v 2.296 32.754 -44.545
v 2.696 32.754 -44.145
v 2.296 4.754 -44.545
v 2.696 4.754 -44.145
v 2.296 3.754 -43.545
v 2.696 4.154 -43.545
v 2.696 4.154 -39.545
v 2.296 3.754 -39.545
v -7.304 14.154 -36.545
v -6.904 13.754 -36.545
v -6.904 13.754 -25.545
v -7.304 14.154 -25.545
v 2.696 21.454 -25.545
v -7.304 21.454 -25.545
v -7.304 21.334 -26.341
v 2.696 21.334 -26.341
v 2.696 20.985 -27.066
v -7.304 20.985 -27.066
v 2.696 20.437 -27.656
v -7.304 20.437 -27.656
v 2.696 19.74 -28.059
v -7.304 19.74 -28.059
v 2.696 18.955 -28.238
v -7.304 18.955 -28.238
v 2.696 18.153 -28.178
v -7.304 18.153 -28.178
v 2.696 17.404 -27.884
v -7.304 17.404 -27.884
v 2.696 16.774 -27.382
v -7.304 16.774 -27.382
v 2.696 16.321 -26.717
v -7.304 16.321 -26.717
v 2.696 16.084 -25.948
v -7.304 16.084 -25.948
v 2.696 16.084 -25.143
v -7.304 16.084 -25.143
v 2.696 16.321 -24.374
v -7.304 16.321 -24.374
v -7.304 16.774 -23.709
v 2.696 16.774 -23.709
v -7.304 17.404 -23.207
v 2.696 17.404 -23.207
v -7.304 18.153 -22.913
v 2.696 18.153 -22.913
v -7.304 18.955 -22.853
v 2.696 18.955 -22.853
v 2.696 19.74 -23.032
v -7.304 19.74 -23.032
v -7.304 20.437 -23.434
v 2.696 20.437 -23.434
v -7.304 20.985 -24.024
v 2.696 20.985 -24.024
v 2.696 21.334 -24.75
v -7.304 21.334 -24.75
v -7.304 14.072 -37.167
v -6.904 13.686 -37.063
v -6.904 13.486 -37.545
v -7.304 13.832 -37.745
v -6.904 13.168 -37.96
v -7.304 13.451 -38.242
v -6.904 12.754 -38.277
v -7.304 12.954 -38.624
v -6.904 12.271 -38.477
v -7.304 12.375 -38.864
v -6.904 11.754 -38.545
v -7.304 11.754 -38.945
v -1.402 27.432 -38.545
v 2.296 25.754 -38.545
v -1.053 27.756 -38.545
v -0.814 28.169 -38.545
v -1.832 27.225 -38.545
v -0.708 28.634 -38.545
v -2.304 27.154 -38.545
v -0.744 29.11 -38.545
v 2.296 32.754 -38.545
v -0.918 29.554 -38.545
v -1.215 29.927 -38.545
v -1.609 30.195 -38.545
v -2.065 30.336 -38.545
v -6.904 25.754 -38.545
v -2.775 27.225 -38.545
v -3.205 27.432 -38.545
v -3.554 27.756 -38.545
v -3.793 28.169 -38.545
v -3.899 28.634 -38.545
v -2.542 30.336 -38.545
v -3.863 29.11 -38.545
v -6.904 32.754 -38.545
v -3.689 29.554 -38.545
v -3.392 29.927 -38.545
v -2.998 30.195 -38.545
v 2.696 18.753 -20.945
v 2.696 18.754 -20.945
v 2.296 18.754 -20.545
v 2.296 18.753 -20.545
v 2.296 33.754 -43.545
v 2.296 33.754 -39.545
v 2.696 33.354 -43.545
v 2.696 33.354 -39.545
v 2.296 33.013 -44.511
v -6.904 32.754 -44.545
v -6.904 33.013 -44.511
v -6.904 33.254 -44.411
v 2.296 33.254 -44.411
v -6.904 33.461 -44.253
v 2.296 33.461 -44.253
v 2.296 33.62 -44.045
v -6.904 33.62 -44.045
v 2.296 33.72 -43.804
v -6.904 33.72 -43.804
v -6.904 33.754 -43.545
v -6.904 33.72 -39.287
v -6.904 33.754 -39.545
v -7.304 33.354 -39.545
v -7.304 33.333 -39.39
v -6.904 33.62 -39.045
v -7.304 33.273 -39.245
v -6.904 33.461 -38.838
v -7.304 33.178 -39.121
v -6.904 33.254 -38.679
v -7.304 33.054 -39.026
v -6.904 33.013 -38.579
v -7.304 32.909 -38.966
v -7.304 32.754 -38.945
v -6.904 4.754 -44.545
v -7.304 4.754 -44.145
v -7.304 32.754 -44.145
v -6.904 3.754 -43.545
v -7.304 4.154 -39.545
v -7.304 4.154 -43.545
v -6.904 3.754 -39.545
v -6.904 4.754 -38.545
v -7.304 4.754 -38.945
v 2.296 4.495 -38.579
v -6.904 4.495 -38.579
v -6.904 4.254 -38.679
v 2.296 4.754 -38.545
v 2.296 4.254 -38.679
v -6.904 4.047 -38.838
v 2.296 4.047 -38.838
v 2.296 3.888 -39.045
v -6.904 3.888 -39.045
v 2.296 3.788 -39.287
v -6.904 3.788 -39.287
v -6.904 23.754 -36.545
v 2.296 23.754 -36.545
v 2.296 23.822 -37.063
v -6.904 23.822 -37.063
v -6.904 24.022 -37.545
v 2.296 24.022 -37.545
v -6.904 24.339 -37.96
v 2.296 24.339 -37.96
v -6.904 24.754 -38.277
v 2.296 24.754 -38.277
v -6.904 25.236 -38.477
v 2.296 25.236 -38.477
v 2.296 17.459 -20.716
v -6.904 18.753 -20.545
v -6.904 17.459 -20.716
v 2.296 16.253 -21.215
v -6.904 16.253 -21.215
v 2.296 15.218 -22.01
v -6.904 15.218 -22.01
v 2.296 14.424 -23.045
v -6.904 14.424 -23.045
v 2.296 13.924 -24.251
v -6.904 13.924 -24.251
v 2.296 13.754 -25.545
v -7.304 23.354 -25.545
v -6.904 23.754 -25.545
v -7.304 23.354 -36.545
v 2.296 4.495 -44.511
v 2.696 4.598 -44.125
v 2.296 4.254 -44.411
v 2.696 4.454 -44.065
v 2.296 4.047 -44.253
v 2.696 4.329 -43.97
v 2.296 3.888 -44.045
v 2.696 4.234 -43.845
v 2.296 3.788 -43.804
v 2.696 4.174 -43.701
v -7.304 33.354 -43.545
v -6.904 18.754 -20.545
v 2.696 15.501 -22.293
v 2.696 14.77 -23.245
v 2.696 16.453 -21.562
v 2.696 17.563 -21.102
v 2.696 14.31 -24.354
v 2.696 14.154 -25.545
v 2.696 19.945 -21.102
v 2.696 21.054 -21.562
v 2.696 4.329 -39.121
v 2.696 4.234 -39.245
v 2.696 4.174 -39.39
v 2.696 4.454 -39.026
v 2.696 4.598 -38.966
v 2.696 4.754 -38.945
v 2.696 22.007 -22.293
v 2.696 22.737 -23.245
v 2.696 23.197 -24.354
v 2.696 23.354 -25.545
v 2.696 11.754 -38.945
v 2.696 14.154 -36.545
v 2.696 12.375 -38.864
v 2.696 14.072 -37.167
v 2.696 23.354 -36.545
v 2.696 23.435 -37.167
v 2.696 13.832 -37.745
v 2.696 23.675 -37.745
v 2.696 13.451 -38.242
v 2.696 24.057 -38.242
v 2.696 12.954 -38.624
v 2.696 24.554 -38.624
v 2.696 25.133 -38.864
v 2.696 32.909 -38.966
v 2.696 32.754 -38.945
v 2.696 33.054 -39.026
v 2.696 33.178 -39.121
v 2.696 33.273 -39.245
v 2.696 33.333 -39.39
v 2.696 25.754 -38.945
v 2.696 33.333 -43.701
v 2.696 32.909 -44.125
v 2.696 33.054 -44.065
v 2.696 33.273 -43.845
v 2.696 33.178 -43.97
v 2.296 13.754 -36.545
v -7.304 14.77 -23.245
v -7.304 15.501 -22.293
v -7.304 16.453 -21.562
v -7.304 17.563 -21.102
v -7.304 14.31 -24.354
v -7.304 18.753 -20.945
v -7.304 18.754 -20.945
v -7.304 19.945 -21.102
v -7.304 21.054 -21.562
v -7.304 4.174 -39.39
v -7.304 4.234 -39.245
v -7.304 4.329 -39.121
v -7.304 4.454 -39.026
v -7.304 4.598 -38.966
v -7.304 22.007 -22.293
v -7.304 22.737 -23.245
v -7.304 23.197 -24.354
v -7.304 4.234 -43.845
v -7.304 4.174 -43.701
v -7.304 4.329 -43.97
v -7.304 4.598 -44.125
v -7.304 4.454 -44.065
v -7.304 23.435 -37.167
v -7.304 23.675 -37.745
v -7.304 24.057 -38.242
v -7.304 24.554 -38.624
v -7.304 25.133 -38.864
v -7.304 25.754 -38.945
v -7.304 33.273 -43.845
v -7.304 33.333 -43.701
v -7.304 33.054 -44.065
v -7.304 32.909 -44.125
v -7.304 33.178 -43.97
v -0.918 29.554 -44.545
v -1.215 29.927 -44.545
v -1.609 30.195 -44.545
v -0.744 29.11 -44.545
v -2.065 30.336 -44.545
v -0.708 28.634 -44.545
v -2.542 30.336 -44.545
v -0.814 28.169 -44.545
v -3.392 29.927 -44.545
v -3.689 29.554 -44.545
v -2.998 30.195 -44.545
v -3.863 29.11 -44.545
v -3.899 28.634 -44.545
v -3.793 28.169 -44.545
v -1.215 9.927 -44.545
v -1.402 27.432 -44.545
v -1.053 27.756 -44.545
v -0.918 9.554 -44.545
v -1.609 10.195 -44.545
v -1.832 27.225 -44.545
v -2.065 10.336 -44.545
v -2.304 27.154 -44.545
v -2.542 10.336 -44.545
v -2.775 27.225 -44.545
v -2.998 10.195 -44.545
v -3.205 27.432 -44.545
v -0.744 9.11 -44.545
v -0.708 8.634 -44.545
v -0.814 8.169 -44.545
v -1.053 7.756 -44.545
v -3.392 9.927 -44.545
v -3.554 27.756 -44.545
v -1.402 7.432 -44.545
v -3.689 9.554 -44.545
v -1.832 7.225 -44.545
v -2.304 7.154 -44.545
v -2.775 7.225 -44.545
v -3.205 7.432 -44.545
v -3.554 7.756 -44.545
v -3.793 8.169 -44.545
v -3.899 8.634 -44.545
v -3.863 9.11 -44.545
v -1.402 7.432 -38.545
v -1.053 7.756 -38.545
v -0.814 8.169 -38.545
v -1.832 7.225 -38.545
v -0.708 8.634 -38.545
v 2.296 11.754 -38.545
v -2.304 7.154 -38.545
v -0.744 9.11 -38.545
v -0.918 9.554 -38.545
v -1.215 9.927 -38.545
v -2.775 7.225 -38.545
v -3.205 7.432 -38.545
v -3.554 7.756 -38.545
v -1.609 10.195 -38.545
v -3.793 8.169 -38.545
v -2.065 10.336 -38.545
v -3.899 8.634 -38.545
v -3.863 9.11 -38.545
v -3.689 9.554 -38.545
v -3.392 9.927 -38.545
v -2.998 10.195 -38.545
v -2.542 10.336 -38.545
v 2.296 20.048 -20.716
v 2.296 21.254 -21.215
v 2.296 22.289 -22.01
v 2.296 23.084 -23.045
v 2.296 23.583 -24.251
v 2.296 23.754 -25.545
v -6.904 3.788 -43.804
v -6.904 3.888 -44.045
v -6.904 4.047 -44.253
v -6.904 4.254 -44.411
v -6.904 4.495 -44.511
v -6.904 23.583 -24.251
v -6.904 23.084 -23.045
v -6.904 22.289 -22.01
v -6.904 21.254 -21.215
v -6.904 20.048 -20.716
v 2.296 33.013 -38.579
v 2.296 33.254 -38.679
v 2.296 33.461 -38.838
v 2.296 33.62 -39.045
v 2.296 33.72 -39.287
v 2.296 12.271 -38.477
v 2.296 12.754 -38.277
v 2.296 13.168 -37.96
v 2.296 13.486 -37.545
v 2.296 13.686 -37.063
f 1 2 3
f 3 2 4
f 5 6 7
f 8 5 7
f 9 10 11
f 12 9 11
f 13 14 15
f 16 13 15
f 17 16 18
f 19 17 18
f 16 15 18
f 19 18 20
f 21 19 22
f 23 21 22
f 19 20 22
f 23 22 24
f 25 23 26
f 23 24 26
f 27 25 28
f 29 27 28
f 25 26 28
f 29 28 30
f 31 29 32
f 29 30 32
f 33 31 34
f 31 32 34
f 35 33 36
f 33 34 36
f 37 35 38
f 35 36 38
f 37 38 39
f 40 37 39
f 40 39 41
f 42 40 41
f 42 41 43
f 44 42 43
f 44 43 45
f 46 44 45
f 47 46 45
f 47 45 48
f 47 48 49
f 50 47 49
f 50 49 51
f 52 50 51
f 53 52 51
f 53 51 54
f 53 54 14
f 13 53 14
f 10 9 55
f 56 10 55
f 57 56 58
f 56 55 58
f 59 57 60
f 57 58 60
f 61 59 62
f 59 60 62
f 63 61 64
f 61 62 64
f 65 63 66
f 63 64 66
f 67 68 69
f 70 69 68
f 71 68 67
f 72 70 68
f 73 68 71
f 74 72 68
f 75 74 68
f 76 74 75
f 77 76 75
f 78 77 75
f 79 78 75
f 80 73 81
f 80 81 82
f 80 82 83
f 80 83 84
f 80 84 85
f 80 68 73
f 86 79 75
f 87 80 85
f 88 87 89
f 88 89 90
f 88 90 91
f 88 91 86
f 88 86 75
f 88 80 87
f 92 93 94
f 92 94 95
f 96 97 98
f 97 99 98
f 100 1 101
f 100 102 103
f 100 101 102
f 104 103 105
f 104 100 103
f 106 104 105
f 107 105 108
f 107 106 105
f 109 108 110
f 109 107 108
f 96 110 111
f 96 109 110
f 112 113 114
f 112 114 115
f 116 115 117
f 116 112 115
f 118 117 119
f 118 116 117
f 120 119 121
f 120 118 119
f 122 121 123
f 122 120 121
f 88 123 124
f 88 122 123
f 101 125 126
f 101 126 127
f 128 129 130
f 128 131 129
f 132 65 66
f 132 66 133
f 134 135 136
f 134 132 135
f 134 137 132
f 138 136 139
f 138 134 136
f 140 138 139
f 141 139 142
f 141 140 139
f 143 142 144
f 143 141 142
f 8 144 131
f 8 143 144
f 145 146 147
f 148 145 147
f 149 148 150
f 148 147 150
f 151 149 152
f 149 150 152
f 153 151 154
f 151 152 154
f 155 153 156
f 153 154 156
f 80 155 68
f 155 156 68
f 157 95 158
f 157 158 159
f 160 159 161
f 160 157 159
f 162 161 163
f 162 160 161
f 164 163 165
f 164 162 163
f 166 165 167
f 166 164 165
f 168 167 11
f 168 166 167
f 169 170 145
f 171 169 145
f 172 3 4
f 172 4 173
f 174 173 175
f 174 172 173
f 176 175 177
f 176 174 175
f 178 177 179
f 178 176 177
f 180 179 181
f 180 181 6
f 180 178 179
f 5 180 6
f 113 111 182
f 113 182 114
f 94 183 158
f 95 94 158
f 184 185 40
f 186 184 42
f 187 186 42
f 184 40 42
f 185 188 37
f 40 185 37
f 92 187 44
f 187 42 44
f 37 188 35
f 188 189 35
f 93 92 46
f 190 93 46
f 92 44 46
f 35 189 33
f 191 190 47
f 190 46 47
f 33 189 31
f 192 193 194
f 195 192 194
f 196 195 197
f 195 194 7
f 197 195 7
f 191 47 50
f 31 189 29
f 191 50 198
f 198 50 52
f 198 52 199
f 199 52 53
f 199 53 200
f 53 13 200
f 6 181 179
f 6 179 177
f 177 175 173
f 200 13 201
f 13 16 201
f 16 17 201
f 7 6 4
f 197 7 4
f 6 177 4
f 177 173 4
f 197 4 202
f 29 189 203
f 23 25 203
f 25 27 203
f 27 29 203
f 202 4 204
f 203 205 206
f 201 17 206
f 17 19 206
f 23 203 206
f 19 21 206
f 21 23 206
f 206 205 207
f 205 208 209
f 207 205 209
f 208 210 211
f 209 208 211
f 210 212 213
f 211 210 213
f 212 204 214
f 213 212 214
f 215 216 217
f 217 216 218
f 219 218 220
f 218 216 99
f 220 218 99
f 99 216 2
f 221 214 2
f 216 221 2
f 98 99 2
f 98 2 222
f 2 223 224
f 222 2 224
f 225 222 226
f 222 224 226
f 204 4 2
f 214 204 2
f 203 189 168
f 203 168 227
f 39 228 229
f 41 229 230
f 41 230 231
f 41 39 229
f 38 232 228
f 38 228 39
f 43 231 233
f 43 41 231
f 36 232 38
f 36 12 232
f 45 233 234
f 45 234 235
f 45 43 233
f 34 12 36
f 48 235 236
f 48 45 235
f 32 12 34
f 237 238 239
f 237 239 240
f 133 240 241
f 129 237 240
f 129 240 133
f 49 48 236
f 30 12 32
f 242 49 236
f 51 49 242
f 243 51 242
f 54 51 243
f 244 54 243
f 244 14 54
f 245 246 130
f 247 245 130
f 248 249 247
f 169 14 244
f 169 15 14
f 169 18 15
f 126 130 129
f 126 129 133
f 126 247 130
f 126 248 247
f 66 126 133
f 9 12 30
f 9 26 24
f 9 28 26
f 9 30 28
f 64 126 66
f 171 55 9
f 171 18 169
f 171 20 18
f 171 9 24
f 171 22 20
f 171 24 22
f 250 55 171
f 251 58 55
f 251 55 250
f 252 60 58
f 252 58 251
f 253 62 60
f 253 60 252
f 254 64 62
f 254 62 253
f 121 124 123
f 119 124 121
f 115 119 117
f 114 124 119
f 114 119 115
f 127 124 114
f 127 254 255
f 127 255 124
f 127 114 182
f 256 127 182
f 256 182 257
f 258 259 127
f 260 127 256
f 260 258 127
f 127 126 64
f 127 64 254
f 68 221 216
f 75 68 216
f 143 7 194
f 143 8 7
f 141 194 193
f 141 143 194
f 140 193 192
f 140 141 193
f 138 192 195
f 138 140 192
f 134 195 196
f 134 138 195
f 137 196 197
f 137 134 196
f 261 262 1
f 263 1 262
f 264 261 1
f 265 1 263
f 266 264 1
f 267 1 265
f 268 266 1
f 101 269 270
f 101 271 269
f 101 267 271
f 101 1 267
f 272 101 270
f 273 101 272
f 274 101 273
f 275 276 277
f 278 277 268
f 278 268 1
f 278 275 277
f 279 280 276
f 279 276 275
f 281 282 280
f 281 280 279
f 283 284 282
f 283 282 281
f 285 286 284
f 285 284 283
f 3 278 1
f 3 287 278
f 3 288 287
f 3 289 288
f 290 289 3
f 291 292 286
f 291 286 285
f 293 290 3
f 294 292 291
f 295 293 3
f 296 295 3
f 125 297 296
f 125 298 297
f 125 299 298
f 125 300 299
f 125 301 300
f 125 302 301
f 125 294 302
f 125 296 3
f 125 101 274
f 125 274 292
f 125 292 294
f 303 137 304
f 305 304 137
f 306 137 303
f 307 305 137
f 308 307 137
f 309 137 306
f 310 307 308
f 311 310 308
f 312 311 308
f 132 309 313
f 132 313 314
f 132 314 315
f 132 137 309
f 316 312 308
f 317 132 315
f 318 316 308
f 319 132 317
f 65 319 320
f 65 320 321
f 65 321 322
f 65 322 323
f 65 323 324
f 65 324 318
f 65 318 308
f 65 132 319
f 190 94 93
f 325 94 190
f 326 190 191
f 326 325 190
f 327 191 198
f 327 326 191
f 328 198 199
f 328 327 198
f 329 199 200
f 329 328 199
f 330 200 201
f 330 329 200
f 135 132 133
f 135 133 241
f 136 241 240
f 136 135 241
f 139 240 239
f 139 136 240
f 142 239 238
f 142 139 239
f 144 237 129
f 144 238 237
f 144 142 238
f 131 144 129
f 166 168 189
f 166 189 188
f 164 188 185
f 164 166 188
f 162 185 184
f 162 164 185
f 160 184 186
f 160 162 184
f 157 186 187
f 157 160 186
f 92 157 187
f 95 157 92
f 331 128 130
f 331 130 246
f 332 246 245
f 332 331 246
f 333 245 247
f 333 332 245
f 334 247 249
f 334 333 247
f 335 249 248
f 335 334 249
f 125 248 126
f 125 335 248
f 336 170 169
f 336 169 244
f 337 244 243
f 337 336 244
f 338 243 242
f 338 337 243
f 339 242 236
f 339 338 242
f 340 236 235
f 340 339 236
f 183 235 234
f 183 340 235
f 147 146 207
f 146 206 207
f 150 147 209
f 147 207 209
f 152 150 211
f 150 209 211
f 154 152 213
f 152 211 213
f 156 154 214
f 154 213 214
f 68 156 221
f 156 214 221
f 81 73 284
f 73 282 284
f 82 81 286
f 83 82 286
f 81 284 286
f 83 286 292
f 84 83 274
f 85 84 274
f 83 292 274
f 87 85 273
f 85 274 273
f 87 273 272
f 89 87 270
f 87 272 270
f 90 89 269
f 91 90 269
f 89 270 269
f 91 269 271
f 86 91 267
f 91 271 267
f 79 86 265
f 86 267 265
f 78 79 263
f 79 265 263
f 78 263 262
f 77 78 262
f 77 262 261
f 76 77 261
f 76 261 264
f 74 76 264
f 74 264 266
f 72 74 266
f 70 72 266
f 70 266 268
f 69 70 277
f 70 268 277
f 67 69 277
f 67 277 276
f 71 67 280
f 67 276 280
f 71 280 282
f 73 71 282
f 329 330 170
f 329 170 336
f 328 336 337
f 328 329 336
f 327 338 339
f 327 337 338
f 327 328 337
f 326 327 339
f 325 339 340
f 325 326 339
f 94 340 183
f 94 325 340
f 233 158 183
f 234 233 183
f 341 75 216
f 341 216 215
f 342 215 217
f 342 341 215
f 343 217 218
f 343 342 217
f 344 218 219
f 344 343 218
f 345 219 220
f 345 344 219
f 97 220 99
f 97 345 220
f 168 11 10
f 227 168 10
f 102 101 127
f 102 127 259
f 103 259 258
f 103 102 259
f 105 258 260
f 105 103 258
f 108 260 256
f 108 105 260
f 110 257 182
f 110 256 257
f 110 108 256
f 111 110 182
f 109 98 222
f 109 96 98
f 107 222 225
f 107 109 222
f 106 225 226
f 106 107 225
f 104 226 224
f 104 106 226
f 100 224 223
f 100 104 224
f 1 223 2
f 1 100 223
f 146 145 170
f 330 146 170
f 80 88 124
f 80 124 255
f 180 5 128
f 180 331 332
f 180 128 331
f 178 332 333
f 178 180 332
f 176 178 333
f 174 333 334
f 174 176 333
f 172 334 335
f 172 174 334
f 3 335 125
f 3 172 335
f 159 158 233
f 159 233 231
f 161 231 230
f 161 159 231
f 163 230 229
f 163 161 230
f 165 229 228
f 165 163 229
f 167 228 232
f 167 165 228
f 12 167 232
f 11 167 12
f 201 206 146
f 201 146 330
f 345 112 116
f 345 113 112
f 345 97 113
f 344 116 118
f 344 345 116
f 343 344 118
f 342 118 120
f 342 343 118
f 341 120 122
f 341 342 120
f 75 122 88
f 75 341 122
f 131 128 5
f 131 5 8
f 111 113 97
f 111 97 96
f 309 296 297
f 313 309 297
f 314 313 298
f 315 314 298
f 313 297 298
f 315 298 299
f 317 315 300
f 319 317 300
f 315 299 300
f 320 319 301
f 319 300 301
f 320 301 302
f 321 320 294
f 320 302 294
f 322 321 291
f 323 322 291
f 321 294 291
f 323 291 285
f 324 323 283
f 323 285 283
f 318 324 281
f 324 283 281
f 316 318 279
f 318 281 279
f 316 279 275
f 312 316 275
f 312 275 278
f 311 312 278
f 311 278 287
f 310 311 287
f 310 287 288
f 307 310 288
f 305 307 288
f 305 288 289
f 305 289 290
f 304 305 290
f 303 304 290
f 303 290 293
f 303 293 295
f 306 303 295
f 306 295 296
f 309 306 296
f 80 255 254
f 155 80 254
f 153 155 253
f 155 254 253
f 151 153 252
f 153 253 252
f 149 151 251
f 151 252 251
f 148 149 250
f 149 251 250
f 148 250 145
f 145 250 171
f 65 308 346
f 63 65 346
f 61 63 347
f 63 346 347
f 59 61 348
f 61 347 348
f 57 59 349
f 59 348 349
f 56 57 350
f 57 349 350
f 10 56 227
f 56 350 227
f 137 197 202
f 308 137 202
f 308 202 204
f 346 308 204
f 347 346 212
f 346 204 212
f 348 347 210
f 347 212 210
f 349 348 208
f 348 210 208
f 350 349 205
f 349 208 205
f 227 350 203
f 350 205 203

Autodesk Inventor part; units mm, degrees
ref_plane "YZ Plane" through (0, 0, 0) normal (1, 0, 0) x (0, 1, 0)
ref_plane "XZ Plane" through (0, 0, 0) normal (0, 1, 0) x (-1, 0, 0)
ref_plane "Plano de trabajo1" through (-7.3035, 18.7537, -25.5454) normal (-1, 0, 0) x (0, 1, 0)
sketch "Boceto1" plane through (-7.3035, 18.7537, -25.5454) normal (-1, 0, 0) x (0, 1, 0)
  line L0 (40.0076, 19) -> (-60.0081, 19) construction
  line L1 (15, 19) -> (-15, 19)
  line L2 (-15, 19) -> (-15, 13)
  line L3 (-15, 13) -> (15, 13)
  line L4 (15, 13) -> (15, 19)
  line L5 (-5, 19) -> (5, 19)
  line L6 (5, 19) -> (5, -5)
  line L7 (5, -5) -> (-5, -5)
  line L8 (-5, -5) -> (-5, 19)
  arc A0 (-1.0724, -0.9) -> (-0.9, -1.0724) centre (0, 0) ccw construction
  circle A1 centre (0, 0) radius 2.7
  point P0 (-18.7537, -25.5454)
  point P1 (0, 19)
  point P2 (0, -5)
  point P3 (-5, 13)
  point P4 (5, 13)
  dimension "d0" = 6
  dimension "d1" = 30
  dimension "d2" = 5.4
  dimension "d3" = 0
  dimension "d4" = 0
  dimension "d5" = 10
  dimension "d6" = 5
extrude "Extrusión1" add sketch "Boceto1" against normal blind 10
sketch "Boceto2" plane through (-7.3035, 23.7537, -38.5454) normal (0, 0, 1) x (1, 0, 0)
  line L0 (0, 0) -> (10, 0) construction
  line L1 (0, 0) -> (0, 10) construction
  line L2 (0, -20) -> (0, -10) construction
  line L3 (0, -10) -> (10, -10) construction
  point P0 (7.3035, -23.7537)
  point P1 (5, 5)
  point P2 (5, -15)
  point P3 (5, 0)
  point P4 (5, -10)
  dimension "d9" = 5
  dimension "d10" = 5
  dimension "d11" = 5
  dimension "d12" = 5
hole "Agujero1" at (-2.3035, 28.7537, -38.5454) at (-2.3035, 8.7537, -38.5454) direction (0, 0, -1) diameter 3.2 end through all
fillet "Empalme1" radius 5 2 edges at (-2.3035, 23.7537, -20.5454) (-2.3035, 13.7537, -20.5454)
fillet "Empalme2" radius 1 4 edges at (-2.3035, 33.7537, -38.5454) (-2.3035, 3.7537, -38.5454) (-2.3035, 33.7537, -44.5454) (-2.3035, 3.7537, -44.5454)
fillet "Empalme3" radius 2 2 edges at (-2.3035, 23.7537, -38.5454) (-2.3035, 13.7537, -38.5454)
chamfer "Chaflán1" distance 0.4 angle 45 24 edges at (-7.3035, 29.2537, -38.5454) (-7.3035, 33.4608, -38.8383) (-7.3035, 33.7537, -41.5454) (-7.3035, 33.4608, -44.2525) (-7.3035, 18.7537, -44.5454) (-7.3035, 4.0466, -44.2525) (-7.3035, 3.7537, -41.5454) (-7.3035, 4.0466, -38.8383) (-7.3035, 8.2537, -38.5454) (-7.3035, 13.7537, -31.0451) (-7.3035, 22.2894, -22.0097) (-7.3035, 23.7537, -31.0451) (2.6965, 29.2537, -38.5454) (2.6965, 23.7537, -31.0451) (2.6965, 22.2894, -22.0097) (2.6965, 13.7537, -31.0451) (2.6965, 8.2537, -38.5454) (2.6965, 4.0466, -38.8383) (2.6965, 3.7537, -41.5454) (2.6965, 4.0466, -44.2525) (2.6965, 18.7537, -44.5454) (2.6965, 33.4608, -44.2525) (2.6965, 33.7537, -41.5454) (2.6965, 33.4608, -38.8383)
properties part number "SoporteEjeMotor"
